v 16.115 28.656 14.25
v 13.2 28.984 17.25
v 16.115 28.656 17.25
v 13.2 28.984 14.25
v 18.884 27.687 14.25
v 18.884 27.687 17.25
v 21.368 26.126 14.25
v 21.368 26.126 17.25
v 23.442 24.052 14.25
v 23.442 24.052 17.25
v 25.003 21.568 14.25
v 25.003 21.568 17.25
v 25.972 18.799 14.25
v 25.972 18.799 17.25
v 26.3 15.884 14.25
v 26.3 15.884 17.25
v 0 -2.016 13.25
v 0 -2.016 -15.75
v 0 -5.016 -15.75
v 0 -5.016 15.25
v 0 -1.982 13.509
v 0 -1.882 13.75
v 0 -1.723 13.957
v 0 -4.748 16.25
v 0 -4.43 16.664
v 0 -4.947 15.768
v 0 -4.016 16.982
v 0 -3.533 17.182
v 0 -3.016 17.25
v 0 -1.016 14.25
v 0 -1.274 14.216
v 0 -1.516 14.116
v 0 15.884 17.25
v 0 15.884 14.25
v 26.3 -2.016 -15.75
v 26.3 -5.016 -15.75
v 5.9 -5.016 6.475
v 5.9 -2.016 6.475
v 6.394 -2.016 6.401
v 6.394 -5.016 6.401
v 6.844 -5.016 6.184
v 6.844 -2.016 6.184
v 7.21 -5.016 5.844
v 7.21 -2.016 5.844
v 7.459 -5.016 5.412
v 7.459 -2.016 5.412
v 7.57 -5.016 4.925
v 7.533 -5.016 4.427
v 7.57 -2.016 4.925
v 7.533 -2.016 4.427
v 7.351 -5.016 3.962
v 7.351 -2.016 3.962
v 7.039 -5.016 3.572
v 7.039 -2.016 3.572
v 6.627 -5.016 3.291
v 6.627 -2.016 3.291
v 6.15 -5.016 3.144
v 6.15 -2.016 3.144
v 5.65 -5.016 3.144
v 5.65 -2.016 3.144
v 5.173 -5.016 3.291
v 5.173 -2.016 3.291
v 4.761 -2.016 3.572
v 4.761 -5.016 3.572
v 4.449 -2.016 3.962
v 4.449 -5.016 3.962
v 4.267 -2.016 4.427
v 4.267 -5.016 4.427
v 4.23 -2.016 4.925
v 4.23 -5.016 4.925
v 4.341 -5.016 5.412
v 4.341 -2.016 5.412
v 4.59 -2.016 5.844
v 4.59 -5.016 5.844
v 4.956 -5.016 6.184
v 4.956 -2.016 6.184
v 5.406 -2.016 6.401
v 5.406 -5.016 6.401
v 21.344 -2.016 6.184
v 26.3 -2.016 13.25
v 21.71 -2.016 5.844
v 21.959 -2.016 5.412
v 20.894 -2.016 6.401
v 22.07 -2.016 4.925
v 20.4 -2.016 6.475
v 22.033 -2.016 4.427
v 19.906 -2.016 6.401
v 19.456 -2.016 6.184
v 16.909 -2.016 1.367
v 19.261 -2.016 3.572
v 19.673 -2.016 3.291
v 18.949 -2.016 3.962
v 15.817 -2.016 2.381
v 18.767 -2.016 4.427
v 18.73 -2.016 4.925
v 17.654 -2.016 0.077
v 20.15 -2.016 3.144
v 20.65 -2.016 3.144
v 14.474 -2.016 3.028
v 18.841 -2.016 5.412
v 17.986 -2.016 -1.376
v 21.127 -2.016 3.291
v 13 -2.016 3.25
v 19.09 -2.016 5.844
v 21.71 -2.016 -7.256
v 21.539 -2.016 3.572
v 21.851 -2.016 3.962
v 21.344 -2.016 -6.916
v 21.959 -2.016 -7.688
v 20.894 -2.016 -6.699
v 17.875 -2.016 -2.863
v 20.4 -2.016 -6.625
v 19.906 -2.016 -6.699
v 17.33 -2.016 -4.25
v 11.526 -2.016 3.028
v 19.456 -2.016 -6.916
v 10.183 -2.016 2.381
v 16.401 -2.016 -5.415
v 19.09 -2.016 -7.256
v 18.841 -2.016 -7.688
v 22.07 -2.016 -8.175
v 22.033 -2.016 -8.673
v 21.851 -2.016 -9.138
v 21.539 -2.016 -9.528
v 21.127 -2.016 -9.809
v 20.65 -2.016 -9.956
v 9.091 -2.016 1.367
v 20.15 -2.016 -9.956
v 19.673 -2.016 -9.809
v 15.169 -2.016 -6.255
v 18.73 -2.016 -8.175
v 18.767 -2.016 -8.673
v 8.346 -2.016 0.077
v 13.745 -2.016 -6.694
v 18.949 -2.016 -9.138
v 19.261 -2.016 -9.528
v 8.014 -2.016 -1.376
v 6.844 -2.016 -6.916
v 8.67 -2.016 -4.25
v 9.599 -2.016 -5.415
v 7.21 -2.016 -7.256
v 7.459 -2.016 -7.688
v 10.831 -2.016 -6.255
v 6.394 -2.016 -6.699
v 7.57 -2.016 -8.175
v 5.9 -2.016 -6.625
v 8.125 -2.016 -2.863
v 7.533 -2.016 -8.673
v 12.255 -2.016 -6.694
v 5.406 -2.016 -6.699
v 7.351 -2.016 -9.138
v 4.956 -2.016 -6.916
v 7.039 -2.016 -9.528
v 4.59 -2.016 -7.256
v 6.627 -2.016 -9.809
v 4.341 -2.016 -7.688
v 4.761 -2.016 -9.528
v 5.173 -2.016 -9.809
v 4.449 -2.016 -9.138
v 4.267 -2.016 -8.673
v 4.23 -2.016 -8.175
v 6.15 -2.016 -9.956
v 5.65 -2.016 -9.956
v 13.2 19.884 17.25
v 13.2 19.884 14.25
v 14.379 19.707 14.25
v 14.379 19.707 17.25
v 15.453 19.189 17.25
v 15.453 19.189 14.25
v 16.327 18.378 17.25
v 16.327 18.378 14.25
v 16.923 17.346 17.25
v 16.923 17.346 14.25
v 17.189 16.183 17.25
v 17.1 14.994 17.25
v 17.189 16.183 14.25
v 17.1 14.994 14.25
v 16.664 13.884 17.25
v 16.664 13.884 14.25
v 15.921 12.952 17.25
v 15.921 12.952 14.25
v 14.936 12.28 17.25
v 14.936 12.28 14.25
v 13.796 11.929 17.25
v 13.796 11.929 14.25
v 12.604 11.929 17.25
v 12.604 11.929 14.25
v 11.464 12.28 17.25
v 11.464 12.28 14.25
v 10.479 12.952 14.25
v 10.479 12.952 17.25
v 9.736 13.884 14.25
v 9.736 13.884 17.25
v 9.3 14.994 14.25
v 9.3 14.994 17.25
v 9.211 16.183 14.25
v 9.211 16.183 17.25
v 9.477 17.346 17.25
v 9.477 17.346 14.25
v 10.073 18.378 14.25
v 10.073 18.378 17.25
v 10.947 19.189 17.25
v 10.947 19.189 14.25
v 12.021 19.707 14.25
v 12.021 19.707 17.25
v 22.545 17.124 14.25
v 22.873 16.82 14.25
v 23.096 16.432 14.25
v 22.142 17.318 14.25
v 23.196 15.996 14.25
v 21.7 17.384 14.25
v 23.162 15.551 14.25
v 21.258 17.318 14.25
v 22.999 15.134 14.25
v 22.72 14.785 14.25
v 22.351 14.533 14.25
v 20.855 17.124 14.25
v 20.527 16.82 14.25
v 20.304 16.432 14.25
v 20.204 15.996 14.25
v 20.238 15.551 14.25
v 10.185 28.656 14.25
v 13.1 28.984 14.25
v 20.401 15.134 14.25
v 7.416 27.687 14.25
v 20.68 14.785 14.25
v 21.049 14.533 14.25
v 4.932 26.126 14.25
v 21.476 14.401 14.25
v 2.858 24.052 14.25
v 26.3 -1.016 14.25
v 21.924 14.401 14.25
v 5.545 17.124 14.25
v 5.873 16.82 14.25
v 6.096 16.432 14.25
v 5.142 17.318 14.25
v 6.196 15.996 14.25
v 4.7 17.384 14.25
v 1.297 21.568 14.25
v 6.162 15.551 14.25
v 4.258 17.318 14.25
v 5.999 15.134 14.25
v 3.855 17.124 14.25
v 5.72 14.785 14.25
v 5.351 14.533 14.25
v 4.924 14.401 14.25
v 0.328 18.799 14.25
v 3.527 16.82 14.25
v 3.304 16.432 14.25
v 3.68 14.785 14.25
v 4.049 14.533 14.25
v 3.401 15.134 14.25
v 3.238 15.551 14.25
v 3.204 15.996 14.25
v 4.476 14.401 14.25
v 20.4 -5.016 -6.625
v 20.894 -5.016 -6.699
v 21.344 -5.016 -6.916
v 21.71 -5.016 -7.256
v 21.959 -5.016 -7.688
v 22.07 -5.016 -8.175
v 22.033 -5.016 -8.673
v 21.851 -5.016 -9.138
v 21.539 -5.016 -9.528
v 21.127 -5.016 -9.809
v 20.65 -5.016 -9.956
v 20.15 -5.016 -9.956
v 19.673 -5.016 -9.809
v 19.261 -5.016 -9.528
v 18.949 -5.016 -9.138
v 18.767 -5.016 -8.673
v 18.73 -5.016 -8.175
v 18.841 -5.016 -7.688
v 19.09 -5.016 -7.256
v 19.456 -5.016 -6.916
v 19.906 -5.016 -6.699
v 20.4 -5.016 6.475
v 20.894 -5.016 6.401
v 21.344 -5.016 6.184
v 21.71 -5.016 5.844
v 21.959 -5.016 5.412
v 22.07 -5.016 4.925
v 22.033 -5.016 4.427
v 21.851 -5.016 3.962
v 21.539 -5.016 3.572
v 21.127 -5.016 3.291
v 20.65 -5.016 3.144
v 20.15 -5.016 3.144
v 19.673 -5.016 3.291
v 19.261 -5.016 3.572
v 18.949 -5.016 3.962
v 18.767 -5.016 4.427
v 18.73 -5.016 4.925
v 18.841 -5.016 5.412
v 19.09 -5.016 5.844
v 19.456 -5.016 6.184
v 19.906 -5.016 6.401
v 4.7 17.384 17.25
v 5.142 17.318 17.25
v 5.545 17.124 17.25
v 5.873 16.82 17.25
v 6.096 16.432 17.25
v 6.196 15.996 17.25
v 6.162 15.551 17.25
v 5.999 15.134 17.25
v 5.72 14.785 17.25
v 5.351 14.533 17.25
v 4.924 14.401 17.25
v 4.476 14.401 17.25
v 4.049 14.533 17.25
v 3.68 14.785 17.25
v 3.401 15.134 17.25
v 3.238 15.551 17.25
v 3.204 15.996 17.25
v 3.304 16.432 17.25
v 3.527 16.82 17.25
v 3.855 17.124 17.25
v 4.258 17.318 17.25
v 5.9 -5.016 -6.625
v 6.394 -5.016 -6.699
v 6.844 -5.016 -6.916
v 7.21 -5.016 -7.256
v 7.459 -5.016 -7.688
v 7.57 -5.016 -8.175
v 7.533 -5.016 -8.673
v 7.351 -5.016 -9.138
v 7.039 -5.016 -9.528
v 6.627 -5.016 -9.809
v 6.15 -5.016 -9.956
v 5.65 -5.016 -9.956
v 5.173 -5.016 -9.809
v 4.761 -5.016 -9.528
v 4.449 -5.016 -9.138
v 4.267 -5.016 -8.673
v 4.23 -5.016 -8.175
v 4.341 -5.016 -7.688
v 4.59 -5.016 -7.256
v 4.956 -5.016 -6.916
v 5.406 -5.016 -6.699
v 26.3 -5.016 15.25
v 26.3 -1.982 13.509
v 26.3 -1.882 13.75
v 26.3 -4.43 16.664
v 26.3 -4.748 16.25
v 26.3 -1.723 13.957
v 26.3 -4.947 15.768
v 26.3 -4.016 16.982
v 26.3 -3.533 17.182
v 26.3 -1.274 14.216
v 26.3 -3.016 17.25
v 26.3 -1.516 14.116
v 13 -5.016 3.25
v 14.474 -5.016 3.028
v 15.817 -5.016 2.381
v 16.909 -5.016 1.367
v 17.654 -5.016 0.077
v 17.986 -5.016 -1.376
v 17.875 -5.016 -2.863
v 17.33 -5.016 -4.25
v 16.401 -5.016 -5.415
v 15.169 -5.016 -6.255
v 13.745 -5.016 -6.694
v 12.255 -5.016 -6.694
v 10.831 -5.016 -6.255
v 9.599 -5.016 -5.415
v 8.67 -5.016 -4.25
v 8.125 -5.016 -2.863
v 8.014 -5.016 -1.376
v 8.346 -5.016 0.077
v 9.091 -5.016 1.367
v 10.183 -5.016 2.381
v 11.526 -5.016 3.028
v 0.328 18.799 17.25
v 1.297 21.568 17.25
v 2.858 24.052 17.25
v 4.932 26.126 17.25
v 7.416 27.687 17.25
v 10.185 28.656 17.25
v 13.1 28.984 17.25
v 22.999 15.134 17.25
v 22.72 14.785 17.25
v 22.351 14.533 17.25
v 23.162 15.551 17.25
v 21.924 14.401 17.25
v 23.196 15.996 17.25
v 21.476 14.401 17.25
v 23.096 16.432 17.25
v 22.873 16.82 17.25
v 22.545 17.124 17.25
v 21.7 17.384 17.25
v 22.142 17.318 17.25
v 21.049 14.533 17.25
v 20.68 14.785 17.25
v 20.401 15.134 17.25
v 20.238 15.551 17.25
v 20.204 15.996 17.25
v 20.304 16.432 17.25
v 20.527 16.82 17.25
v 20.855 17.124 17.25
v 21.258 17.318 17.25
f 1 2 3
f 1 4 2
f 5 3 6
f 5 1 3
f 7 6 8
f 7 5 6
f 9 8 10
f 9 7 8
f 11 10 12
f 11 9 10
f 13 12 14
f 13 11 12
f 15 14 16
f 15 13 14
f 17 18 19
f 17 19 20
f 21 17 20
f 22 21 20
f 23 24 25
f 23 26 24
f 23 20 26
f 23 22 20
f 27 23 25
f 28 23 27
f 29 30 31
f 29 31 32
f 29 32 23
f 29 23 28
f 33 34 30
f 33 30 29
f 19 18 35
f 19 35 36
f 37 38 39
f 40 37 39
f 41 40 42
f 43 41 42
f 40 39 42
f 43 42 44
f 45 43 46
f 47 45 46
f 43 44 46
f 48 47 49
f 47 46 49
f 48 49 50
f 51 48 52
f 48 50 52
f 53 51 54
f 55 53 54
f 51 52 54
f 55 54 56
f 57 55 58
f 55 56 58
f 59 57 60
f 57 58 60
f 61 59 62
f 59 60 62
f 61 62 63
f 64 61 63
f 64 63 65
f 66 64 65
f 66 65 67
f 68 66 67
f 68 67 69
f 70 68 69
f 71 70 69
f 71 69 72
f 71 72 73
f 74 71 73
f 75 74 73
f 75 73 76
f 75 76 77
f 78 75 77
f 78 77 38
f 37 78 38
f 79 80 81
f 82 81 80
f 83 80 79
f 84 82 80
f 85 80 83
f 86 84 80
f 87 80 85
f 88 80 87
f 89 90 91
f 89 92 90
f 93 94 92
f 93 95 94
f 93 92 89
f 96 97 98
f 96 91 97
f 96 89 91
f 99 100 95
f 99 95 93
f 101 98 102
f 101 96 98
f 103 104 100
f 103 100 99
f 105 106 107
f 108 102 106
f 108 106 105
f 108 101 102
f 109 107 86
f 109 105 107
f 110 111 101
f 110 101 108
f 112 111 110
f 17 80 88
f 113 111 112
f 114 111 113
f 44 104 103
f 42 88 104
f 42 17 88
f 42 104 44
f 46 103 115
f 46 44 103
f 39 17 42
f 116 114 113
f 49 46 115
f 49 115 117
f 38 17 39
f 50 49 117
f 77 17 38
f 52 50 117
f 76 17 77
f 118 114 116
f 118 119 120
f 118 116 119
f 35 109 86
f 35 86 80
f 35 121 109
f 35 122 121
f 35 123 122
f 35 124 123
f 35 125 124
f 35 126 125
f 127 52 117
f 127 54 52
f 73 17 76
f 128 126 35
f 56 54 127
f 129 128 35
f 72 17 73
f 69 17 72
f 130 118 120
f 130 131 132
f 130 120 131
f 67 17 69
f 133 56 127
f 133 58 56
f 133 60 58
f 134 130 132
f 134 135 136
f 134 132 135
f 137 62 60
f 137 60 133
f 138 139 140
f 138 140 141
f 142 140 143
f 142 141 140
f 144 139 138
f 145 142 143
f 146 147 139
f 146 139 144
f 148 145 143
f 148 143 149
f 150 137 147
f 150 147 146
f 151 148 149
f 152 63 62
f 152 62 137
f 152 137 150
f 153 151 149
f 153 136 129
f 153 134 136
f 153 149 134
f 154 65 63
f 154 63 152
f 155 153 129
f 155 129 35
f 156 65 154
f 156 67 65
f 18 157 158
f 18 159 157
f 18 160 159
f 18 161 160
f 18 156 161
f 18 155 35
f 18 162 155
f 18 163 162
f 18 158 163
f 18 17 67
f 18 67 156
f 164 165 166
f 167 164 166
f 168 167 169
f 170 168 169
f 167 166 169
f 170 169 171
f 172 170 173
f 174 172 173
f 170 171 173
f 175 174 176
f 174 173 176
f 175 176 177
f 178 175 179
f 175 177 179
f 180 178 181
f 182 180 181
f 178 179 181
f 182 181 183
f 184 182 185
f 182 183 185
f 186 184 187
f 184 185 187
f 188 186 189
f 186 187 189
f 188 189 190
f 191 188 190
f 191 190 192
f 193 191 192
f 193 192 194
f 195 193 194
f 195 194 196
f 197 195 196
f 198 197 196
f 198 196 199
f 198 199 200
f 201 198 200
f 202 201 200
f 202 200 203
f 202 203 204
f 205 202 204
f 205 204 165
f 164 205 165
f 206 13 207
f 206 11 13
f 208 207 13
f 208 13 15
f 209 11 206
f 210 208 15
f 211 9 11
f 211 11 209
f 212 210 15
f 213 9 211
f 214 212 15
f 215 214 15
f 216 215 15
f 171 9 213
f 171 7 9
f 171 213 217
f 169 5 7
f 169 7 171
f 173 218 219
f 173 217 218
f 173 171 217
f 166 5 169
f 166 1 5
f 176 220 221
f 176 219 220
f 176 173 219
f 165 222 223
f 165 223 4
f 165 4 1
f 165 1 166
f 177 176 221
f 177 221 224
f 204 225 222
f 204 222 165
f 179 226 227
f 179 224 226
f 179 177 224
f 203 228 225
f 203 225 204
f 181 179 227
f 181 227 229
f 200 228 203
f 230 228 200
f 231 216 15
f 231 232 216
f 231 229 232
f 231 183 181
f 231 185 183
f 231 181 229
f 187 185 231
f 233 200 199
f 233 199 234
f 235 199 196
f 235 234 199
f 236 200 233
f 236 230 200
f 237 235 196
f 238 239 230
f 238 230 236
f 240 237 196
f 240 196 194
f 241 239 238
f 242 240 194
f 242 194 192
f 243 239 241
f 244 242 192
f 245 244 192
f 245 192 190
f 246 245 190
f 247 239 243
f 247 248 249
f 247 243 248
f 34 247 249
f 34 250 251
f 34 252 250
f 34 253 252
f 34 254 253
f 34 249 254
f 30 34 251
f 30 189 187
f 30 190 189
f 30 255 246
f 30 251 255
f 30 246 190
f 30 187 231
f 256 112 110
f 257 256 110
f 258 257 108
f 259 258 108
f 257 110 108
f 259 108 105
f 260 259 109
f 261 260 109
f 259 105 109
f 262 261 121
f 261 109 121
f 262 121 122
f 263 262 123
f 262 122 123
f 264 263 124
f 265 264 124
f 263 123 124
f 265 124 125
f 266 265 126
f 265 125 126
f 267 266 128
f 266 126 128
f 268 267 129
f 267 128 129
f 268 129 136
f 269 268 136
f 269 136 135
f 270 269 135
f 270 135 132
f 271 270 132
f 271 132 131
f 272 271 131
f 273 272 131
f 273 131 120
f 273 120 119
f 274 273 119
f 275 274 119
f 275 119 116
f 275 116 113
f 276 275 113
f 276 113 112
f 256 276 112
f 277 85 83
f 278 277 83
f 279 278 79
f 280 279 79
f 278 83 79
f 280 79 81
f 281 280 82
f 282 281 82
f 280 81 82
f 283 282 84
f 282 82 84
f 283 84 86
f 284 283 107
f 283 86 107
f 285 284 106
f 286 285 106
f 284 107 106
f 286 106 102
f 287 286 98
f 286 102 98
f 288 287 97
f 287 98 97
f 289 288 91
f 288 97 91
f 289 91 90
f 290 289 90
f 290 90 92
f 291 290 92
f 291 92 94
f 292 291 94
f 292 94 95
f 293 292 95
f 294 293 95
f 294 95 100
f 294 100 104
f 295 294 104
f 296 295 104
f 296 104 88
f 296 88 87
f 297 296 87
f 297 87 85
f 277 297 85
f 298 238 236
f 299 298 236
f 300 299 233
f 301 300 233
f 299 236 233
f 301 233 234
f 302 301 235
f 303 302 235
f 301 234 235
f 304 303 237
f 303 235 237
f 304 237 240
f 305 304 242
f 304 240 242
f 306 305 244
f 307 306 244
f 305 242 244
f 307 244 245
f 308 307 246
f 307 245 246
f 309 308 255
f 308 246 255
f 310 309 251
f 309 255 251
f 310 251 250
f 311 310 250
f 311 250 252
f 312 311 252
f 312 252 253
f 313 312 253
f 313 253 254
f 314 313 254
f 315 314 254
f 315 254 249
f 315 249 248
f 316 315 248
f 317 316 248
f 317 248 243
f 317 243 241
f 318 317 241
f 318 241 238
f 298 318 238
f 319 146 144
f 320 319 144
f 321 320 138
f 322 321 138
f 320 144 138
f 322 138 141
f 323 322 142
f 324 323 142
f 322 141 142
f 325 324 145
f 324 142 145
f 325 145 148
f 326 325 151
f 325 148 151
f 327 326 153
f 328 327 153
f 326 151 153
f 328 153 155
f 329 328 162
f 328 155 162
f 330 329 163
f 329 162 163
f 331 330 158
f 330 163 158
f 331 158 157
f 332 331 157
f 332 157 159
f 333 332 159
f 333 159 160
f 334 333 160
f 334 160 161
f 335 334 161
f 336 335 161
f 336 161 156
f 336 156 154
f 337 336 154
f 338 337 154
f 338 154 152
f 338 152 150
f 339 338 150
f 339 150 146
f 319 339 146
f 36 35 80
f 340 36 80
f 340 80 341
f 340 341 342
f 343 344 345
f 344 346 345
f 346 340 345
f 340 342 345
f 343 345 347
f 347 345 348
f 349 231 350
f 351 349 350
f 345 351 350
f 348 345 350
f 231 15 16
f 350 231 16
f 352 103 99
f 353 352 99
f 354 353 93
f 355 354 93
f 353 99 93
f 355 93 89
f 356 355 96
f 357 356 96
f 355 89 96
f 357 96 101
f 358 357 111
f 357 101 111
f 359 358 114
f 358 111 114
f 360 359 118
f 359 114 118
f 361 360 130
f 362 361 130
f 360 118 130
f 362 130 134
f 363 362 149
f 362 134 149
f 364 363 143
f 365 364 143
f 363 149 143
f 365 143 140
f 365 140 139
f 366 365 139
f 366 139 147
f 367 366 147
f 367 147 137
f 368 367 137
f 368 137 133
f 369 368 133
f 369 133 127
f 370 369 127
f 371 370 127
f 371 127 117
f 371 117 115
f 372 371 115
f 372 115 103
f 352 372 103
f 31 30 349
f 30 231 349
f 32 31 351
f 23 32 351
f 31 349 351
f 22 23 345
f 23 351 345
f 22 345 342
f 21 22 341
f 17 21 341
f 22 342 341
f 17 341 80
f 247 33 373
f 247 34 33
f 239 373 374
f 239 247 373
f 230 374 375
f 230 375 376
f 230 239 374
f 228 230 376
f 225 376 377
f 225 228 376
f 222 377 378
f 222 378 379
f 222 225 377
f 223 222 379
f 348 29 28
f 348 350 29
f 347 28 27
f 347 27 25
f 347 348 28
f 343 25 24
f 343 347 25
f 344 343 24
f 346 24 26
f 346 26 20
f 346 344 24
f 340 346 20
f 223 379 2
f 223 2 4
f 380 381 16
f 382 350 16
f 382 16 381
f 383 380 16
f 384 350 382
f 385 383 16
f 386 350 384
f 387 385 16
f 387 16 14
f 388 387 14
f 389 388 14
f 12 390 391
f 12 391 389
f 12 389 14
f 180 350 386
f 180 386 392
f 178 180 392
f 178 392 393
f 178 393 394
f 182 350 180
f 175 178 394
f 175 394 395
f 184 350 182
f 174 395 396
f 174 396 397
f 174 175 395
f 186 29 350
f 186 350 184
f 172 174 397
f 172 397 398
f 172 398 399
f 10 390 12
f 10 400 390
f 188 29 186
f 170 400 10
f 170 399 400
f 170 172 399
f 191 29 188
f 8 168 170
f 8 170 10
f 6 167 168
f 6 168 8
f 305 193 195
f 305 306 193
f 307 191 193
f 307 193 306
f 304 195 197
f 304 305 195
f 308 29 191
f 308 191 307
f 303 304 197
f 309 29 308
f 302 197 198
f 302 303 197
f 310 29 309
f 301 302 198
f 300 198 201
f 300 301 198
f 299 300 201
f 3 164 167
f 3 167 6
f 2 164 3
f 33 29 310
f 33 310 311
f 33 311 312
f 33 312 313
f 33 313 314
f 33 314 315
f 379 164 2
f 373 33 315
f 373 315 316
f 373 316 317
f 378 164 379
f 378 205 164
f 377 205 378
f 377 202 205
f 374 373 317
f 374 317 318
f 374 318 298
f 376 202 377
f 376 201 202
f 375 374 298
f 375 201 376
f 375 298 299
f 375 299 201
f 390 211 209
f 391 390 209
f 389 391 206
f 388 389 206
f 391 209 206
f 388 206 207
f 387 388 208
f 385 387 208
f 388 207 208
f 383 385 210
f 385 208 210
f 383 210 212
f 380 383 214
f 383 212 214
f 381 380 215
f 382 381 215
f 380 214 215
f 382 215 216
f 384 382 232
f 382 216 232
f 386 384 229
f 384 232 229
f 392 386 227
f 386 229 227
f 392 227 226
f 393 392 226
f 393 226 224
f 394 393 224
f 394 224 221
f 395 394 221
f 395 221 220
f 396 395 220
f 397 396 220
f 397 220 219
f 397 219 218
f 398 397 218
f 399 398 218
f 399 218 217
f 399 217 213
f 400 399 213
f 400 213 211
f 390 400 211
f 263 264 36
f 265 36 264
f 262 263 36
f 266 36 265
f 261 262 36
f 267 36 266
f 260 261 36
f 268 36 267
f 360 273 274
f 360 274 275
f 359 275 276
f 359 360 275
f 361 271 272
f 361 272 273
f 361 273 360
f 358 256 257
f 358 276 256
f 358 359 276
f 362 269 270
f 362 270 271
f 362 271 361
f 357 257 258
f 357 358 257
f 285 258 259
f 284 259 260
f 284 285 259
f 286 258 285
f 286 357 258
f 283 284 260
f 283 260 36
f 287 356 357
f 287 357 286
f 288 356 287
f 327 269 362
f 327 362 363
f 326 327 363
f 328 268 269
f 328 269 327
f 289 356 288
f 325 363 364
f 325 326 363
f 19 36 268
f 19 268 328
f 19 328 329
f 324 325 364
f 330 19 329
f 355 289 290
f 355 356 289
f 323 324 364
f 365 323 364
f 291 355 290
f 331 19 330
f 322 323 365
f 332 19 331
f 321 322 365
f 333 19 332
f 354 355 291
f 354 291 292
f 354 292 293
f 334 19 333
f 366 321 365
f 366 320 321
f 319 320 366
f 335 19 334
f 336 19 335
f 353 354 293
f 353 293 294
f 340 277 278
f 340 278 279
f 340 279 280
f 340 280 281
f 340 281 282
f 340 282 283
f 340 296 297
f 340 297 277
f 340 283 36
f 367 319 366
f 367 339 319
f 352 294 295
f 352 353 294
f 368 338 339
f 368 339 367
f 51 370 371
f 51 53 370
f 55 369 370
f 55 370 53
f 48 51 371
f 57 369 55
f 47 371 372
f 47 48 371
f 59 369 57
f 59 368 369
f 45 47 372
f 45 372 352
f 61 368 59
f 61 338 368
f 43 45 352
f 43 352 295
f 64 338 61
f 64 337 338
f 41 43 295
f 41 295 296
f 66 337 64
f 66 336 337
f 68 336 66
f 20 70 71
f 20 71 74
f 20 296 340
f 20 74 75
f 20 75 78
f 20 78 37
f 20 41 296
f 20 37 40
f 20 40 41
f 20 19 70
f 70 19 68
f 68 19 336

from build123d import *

# Parameters (mm, degrees)
SALIENTE_EXTRUIR1_DEPTH = 26.3
REDONDEO1_R             = 1
REDONDEO2_R             = 2
REDONDEO3_R             = 13.1
CROQUIS2_R              = 5
CROQUIS2_R_2            = 1.675
CORTAR_EXTRUIR1_DEPTH   = 45.161663239
CROQUIS3_R              = 4
CROQUIS3_R_2            = 1.5
CORTAR_EXTRUIR2_DEPTH   = 50.313121927


with BuildPart() as part:
    # Croquis1 → Saliente-Extruir1 (new body)
    with BuildSketch(Plane(origin=(0, 0, 0), x_dir=(0, 0, -1), z_dir=(1, 0, 0))):
        Polygon((-17.25, 28.984375), (-14.25, 28.984375), (-14.25, -2.015625), (15.75, -2.015625), (15.75, -5.015625), (-17.25, -5.015625), align=None)
    extrude(amount=SALIENTE_EXTRUIR1_DEPTH)

    # Redondeo1
    redondeo1_edges = [part.edges().sort_by_distance(p)[0] for p in [
        (13.15, -2.015625, 14.25),
    ]]
    fillet(redondeo1_edges, radius=REDONDEO1_R)

    # Redondeo2
    redondeo2_edges = [part.edges().sort_by_distance(p)[0] for p in [
        (13.15, -5.015625, 17.25),
    ]]
    fillet(redondeo2_edges, radius=REDONDEO2_R)

    # Redondeo3
    redondeo3_edges = [part.edges().sort_by_distance(p)[0] for p in [
        (26.3, 28.984375, 15.75),
        (0, 28.984375, 15.75),
    ]]
    fillet(redondeo3_edges, radius=REDONDEO3_R)

    # Croquis2 → Cortar-Extruir1 (cut, through all)
    with BuildSketch(Plane(origin=(0, -2.015625, 0), x_dir=(1, 0, 0), z_dir=(0, 1, 0))):
        with Locations(Location((13, 1.75, 0), (0, 0, 270))):
            Circle(CROQUIS2_R)
        with Locations(Location((5.9, 8.3, 0), (0, 0, 270))):
            Circle(CROQUIS2_R_2)
        with Locations(Location((20.4, 8.3, 0), (0, 0, 270))):
            Circle(CROQUIS2_R_2)
        with Locations(Location((20.4, -4.8, 0), (0, 0, 270))):
            Circle(CROQUIS2_R_2)
        with Locations(Location((5.9, -4.8, 0), (0, 0, 270))):
            Circle(CROQUIS2_R_2)
    extrude(amount=-CORTAR_EXTRUIR1_DEPTH, mode=Mode.SUBTRACT)

    # Croquis3 → Cortar-Extruir2 (cut, through all)
    with BuildSketch(Plane(origin=(0, 0, 14.25), x_dir=(-1, 0, 0), z_dir=(0, 0, -1))):
        with Locations(Location((-13.2, 15.884375, 0), (0, 0, 90))):
            Circle(CROQUIS3_R)
        with Locations(Location((-21.7, 15.884375, 0), (0, 0, 90))):
            Circle(CROQUIS3_R_2)
        with Locations(Location((-4.7, 15.884375, 0), (0, 0, 90))):
            Circle(CROQUIS3_R_2)
    extrude(amount=-CORTAR_EXTRUIR2_DEPTH, mode=Mode.SUBTRACT)


solid = part.part
